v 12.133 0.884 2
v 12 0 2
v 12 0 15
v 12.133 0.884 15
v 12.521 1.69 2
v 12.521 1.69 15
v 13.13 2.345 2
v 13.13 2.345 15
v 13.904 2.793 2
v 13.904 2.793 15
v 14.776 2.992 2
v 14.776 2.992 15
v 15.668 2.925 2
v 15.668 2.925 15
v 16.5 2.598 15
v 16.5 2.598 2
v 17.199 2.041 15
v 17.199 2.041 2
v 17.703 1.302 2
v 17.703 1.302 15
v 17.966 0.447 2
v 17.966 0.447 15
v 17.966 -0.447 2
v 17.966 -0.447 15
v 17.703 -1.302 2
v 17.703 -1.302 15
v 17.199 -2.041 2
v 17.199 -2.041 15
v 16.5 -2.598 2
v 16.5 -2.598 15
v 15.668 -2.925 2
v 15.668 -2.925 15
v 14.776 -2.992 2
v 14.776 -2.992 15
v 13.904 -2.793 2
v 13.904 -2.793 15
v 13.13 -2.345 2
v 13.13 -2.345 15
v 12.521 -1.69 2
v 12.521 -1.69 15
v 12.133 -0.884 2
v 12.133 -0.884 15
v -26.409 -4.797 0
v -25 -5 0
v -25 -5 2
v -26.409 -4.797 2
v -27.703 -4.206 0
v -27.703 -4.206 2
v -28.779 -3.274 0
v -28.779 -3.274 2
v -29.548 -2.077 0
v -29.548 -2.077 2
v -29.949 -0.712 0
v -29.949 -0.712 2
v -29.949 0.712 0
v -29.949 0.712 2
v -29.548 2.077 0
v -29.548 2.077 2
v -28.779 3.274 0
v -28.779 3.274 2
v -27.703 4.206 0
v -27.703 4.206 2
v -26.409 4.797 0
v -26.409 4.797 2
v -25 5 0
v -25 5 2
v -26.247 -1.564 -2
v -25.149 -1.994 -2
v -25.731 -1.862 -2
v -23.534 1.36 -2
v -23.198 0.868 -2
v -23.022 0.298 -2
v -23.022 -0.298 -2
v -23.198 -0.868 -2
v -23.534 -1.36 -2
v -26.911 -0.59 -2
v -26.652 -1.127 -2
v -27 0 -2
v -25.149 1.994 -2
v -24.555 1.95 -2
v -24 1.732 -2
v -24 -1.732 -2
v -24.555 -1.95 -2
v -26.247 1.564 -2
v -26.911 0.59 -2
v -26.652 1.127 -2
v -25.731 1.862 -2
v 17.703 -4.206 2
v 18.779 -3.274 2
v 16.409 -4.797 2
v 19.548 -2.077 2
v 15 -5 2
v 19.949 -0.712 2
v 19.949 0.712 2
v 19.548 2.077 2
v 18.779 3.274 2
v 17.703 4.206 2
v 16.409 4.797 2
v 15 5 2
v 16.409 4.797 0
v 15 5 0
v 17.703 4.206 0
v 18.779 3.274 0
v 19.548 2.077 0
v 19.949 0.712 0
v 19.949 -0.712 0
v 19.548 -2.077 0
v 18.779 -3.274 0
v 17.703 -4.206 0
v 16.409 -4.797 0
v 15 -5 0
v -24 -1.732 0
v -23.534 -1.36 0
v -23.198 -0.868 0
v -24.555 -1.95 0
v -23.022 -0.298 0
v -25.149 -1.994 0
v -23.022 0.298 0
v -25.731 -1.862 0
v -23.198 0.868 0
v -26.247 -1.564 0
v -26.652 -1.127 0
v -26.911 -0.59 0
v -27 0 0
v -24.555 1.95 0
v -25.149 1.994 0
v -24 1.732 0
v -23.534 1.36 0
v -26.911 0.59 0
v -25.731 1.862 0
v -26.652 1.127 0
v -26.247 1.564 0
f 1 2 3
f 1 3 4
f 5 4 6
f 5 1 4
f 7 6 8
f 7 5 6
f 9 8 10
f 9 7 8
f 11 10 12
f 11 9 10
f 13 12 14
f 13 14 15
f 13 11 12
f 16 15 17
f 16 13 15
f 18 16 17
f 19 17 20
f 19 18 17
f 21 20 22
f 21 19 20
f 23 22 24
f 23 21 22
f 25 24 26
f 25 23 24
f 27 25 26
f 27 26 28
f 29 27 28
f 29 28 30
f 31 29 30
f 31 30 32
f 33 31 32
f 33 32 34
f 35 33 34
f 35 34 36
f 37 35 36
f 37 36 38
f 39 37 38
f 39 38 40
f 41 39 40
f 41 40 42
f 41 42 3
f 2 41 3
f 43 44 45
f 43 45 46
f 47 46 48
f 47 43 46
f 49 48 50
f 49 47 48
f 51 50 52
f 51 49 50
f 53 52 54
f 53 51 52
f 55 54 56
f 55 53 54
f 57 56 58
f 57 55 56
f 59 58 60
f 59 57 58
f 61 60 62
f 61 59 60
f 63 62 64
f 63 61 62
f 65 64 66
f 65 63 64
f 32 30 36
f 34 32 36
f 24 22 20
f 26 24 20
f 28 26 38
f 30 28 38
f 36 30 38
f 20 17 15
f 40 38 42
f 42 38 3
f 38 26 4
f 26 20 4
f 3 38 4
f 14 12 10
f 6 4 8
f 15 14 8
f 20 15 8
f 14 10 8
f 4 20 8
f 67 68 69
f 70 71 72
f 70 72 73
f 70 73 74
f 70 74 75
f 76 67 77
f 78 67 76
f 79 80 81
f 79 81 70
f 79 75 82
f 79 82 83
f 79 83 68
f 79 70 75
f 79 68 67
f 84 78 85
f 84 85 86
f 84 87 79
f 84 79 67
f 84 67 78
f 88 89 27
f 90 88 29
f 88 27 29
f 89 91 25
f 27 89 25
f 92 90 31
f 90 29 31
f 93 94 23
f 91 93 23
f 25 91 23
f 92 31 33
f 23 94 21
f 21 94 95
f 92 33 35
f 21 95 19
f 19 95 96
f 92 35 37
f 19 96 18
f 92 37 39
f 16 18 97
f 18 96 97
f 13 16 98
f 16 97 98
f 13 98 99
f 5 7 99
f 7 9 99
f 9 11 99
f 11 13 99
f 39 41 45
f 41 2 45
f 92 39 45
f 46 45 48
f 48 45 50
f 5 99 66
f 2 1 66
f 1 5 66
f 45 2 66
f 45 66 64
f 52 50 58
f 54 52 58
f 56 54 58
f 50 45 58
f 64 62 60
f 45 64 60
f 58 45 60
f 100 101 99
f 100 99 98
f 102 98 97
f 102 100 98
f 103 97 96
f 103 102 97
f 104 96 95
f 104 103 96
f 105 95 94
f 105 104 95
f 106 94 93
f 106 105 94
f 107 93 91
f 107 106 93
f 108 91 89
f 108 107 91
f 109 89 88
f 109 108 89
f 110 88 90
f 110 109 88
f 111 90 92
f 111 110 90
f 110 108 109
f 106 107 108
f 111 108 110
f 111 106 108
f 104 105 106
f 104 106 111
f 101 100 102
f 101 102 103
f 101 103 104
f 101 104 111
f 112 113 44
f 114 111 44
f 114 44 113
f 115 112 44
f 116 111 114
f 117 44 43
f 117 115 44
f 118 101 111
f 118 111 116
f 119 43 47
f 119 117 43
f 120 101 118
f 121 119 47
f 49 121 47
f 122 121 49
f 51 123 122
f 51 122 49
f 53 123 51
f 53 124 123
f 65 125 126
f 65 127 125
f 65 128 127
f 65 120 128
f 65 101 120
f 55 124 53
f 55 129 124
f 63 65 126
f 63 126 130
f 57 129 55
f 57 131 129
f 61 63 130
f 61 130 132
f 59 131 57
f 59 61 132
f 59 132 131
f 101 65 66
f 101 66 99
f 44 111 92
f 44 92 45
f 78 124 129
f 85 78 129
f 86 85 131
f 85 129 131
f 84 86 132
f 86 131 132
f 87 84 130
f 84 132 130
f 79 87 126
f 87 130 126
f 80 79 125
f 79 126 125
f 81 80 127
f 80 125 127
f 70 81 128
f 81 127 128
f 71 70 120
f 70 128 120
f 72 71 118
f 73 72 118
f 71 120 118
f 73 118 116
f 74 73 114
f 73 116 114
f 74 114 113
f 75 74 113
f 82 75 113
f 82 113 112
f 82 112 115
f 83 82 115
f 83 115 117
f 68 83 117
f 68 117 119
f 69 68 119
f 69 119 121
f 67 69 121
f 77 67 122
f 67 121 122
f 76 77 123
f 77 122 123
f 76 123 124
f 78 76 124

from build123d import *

# Parameters (mm, degrees)
EXTRUDE_1_DEPTH = 2
SKETCH_2_R      = 2
EXTRUDE_2_DEPTH = 2
SKETCH_3_R      = 3
EXTRUDE_4_DEPTH = 15


with BuildPart() as part:
    # 草图1 → 凸台-拉伸1 (new body)
    with BuildSketch(Plane.XY):
        with BuildLine():
            Line((-25, 5), (15, 5))
            ThreePointArc((15, 5), (20, 0), (15, -5))
            Line((15, -5), (-25, -5))
            ThreePointArc((-25, -5), (-30, 0), (-25, 5))
        make_face()
    extrude(amount=EXTRUDE_1_DEPTH)

    # 草图2 → 凸台-拉伸2 (add)
    with BuildSketch(Plane(origin=(0, 0, 0), x_dir=(-1, 0, 0), z_dir=(0, 0, -1))):
        with Locations((25, 0)):
            Circle(SKETCH_2_R)
    extrude(amount=EXTRUDE_2_DEPTH)

    # 草图3 → 凸台-拉伸4 (add)
    with BuildSketch(Plane(origin=(0, 0, 0), x_dir=(-1, 0, 0), z_dir=(0, 0, -1))):
        with Locations((-15, 0)):
            Circle(SKETCH_3_R)
    extrude(amount=-EXTRUDE_4_DEPTH)


solid = part.part
